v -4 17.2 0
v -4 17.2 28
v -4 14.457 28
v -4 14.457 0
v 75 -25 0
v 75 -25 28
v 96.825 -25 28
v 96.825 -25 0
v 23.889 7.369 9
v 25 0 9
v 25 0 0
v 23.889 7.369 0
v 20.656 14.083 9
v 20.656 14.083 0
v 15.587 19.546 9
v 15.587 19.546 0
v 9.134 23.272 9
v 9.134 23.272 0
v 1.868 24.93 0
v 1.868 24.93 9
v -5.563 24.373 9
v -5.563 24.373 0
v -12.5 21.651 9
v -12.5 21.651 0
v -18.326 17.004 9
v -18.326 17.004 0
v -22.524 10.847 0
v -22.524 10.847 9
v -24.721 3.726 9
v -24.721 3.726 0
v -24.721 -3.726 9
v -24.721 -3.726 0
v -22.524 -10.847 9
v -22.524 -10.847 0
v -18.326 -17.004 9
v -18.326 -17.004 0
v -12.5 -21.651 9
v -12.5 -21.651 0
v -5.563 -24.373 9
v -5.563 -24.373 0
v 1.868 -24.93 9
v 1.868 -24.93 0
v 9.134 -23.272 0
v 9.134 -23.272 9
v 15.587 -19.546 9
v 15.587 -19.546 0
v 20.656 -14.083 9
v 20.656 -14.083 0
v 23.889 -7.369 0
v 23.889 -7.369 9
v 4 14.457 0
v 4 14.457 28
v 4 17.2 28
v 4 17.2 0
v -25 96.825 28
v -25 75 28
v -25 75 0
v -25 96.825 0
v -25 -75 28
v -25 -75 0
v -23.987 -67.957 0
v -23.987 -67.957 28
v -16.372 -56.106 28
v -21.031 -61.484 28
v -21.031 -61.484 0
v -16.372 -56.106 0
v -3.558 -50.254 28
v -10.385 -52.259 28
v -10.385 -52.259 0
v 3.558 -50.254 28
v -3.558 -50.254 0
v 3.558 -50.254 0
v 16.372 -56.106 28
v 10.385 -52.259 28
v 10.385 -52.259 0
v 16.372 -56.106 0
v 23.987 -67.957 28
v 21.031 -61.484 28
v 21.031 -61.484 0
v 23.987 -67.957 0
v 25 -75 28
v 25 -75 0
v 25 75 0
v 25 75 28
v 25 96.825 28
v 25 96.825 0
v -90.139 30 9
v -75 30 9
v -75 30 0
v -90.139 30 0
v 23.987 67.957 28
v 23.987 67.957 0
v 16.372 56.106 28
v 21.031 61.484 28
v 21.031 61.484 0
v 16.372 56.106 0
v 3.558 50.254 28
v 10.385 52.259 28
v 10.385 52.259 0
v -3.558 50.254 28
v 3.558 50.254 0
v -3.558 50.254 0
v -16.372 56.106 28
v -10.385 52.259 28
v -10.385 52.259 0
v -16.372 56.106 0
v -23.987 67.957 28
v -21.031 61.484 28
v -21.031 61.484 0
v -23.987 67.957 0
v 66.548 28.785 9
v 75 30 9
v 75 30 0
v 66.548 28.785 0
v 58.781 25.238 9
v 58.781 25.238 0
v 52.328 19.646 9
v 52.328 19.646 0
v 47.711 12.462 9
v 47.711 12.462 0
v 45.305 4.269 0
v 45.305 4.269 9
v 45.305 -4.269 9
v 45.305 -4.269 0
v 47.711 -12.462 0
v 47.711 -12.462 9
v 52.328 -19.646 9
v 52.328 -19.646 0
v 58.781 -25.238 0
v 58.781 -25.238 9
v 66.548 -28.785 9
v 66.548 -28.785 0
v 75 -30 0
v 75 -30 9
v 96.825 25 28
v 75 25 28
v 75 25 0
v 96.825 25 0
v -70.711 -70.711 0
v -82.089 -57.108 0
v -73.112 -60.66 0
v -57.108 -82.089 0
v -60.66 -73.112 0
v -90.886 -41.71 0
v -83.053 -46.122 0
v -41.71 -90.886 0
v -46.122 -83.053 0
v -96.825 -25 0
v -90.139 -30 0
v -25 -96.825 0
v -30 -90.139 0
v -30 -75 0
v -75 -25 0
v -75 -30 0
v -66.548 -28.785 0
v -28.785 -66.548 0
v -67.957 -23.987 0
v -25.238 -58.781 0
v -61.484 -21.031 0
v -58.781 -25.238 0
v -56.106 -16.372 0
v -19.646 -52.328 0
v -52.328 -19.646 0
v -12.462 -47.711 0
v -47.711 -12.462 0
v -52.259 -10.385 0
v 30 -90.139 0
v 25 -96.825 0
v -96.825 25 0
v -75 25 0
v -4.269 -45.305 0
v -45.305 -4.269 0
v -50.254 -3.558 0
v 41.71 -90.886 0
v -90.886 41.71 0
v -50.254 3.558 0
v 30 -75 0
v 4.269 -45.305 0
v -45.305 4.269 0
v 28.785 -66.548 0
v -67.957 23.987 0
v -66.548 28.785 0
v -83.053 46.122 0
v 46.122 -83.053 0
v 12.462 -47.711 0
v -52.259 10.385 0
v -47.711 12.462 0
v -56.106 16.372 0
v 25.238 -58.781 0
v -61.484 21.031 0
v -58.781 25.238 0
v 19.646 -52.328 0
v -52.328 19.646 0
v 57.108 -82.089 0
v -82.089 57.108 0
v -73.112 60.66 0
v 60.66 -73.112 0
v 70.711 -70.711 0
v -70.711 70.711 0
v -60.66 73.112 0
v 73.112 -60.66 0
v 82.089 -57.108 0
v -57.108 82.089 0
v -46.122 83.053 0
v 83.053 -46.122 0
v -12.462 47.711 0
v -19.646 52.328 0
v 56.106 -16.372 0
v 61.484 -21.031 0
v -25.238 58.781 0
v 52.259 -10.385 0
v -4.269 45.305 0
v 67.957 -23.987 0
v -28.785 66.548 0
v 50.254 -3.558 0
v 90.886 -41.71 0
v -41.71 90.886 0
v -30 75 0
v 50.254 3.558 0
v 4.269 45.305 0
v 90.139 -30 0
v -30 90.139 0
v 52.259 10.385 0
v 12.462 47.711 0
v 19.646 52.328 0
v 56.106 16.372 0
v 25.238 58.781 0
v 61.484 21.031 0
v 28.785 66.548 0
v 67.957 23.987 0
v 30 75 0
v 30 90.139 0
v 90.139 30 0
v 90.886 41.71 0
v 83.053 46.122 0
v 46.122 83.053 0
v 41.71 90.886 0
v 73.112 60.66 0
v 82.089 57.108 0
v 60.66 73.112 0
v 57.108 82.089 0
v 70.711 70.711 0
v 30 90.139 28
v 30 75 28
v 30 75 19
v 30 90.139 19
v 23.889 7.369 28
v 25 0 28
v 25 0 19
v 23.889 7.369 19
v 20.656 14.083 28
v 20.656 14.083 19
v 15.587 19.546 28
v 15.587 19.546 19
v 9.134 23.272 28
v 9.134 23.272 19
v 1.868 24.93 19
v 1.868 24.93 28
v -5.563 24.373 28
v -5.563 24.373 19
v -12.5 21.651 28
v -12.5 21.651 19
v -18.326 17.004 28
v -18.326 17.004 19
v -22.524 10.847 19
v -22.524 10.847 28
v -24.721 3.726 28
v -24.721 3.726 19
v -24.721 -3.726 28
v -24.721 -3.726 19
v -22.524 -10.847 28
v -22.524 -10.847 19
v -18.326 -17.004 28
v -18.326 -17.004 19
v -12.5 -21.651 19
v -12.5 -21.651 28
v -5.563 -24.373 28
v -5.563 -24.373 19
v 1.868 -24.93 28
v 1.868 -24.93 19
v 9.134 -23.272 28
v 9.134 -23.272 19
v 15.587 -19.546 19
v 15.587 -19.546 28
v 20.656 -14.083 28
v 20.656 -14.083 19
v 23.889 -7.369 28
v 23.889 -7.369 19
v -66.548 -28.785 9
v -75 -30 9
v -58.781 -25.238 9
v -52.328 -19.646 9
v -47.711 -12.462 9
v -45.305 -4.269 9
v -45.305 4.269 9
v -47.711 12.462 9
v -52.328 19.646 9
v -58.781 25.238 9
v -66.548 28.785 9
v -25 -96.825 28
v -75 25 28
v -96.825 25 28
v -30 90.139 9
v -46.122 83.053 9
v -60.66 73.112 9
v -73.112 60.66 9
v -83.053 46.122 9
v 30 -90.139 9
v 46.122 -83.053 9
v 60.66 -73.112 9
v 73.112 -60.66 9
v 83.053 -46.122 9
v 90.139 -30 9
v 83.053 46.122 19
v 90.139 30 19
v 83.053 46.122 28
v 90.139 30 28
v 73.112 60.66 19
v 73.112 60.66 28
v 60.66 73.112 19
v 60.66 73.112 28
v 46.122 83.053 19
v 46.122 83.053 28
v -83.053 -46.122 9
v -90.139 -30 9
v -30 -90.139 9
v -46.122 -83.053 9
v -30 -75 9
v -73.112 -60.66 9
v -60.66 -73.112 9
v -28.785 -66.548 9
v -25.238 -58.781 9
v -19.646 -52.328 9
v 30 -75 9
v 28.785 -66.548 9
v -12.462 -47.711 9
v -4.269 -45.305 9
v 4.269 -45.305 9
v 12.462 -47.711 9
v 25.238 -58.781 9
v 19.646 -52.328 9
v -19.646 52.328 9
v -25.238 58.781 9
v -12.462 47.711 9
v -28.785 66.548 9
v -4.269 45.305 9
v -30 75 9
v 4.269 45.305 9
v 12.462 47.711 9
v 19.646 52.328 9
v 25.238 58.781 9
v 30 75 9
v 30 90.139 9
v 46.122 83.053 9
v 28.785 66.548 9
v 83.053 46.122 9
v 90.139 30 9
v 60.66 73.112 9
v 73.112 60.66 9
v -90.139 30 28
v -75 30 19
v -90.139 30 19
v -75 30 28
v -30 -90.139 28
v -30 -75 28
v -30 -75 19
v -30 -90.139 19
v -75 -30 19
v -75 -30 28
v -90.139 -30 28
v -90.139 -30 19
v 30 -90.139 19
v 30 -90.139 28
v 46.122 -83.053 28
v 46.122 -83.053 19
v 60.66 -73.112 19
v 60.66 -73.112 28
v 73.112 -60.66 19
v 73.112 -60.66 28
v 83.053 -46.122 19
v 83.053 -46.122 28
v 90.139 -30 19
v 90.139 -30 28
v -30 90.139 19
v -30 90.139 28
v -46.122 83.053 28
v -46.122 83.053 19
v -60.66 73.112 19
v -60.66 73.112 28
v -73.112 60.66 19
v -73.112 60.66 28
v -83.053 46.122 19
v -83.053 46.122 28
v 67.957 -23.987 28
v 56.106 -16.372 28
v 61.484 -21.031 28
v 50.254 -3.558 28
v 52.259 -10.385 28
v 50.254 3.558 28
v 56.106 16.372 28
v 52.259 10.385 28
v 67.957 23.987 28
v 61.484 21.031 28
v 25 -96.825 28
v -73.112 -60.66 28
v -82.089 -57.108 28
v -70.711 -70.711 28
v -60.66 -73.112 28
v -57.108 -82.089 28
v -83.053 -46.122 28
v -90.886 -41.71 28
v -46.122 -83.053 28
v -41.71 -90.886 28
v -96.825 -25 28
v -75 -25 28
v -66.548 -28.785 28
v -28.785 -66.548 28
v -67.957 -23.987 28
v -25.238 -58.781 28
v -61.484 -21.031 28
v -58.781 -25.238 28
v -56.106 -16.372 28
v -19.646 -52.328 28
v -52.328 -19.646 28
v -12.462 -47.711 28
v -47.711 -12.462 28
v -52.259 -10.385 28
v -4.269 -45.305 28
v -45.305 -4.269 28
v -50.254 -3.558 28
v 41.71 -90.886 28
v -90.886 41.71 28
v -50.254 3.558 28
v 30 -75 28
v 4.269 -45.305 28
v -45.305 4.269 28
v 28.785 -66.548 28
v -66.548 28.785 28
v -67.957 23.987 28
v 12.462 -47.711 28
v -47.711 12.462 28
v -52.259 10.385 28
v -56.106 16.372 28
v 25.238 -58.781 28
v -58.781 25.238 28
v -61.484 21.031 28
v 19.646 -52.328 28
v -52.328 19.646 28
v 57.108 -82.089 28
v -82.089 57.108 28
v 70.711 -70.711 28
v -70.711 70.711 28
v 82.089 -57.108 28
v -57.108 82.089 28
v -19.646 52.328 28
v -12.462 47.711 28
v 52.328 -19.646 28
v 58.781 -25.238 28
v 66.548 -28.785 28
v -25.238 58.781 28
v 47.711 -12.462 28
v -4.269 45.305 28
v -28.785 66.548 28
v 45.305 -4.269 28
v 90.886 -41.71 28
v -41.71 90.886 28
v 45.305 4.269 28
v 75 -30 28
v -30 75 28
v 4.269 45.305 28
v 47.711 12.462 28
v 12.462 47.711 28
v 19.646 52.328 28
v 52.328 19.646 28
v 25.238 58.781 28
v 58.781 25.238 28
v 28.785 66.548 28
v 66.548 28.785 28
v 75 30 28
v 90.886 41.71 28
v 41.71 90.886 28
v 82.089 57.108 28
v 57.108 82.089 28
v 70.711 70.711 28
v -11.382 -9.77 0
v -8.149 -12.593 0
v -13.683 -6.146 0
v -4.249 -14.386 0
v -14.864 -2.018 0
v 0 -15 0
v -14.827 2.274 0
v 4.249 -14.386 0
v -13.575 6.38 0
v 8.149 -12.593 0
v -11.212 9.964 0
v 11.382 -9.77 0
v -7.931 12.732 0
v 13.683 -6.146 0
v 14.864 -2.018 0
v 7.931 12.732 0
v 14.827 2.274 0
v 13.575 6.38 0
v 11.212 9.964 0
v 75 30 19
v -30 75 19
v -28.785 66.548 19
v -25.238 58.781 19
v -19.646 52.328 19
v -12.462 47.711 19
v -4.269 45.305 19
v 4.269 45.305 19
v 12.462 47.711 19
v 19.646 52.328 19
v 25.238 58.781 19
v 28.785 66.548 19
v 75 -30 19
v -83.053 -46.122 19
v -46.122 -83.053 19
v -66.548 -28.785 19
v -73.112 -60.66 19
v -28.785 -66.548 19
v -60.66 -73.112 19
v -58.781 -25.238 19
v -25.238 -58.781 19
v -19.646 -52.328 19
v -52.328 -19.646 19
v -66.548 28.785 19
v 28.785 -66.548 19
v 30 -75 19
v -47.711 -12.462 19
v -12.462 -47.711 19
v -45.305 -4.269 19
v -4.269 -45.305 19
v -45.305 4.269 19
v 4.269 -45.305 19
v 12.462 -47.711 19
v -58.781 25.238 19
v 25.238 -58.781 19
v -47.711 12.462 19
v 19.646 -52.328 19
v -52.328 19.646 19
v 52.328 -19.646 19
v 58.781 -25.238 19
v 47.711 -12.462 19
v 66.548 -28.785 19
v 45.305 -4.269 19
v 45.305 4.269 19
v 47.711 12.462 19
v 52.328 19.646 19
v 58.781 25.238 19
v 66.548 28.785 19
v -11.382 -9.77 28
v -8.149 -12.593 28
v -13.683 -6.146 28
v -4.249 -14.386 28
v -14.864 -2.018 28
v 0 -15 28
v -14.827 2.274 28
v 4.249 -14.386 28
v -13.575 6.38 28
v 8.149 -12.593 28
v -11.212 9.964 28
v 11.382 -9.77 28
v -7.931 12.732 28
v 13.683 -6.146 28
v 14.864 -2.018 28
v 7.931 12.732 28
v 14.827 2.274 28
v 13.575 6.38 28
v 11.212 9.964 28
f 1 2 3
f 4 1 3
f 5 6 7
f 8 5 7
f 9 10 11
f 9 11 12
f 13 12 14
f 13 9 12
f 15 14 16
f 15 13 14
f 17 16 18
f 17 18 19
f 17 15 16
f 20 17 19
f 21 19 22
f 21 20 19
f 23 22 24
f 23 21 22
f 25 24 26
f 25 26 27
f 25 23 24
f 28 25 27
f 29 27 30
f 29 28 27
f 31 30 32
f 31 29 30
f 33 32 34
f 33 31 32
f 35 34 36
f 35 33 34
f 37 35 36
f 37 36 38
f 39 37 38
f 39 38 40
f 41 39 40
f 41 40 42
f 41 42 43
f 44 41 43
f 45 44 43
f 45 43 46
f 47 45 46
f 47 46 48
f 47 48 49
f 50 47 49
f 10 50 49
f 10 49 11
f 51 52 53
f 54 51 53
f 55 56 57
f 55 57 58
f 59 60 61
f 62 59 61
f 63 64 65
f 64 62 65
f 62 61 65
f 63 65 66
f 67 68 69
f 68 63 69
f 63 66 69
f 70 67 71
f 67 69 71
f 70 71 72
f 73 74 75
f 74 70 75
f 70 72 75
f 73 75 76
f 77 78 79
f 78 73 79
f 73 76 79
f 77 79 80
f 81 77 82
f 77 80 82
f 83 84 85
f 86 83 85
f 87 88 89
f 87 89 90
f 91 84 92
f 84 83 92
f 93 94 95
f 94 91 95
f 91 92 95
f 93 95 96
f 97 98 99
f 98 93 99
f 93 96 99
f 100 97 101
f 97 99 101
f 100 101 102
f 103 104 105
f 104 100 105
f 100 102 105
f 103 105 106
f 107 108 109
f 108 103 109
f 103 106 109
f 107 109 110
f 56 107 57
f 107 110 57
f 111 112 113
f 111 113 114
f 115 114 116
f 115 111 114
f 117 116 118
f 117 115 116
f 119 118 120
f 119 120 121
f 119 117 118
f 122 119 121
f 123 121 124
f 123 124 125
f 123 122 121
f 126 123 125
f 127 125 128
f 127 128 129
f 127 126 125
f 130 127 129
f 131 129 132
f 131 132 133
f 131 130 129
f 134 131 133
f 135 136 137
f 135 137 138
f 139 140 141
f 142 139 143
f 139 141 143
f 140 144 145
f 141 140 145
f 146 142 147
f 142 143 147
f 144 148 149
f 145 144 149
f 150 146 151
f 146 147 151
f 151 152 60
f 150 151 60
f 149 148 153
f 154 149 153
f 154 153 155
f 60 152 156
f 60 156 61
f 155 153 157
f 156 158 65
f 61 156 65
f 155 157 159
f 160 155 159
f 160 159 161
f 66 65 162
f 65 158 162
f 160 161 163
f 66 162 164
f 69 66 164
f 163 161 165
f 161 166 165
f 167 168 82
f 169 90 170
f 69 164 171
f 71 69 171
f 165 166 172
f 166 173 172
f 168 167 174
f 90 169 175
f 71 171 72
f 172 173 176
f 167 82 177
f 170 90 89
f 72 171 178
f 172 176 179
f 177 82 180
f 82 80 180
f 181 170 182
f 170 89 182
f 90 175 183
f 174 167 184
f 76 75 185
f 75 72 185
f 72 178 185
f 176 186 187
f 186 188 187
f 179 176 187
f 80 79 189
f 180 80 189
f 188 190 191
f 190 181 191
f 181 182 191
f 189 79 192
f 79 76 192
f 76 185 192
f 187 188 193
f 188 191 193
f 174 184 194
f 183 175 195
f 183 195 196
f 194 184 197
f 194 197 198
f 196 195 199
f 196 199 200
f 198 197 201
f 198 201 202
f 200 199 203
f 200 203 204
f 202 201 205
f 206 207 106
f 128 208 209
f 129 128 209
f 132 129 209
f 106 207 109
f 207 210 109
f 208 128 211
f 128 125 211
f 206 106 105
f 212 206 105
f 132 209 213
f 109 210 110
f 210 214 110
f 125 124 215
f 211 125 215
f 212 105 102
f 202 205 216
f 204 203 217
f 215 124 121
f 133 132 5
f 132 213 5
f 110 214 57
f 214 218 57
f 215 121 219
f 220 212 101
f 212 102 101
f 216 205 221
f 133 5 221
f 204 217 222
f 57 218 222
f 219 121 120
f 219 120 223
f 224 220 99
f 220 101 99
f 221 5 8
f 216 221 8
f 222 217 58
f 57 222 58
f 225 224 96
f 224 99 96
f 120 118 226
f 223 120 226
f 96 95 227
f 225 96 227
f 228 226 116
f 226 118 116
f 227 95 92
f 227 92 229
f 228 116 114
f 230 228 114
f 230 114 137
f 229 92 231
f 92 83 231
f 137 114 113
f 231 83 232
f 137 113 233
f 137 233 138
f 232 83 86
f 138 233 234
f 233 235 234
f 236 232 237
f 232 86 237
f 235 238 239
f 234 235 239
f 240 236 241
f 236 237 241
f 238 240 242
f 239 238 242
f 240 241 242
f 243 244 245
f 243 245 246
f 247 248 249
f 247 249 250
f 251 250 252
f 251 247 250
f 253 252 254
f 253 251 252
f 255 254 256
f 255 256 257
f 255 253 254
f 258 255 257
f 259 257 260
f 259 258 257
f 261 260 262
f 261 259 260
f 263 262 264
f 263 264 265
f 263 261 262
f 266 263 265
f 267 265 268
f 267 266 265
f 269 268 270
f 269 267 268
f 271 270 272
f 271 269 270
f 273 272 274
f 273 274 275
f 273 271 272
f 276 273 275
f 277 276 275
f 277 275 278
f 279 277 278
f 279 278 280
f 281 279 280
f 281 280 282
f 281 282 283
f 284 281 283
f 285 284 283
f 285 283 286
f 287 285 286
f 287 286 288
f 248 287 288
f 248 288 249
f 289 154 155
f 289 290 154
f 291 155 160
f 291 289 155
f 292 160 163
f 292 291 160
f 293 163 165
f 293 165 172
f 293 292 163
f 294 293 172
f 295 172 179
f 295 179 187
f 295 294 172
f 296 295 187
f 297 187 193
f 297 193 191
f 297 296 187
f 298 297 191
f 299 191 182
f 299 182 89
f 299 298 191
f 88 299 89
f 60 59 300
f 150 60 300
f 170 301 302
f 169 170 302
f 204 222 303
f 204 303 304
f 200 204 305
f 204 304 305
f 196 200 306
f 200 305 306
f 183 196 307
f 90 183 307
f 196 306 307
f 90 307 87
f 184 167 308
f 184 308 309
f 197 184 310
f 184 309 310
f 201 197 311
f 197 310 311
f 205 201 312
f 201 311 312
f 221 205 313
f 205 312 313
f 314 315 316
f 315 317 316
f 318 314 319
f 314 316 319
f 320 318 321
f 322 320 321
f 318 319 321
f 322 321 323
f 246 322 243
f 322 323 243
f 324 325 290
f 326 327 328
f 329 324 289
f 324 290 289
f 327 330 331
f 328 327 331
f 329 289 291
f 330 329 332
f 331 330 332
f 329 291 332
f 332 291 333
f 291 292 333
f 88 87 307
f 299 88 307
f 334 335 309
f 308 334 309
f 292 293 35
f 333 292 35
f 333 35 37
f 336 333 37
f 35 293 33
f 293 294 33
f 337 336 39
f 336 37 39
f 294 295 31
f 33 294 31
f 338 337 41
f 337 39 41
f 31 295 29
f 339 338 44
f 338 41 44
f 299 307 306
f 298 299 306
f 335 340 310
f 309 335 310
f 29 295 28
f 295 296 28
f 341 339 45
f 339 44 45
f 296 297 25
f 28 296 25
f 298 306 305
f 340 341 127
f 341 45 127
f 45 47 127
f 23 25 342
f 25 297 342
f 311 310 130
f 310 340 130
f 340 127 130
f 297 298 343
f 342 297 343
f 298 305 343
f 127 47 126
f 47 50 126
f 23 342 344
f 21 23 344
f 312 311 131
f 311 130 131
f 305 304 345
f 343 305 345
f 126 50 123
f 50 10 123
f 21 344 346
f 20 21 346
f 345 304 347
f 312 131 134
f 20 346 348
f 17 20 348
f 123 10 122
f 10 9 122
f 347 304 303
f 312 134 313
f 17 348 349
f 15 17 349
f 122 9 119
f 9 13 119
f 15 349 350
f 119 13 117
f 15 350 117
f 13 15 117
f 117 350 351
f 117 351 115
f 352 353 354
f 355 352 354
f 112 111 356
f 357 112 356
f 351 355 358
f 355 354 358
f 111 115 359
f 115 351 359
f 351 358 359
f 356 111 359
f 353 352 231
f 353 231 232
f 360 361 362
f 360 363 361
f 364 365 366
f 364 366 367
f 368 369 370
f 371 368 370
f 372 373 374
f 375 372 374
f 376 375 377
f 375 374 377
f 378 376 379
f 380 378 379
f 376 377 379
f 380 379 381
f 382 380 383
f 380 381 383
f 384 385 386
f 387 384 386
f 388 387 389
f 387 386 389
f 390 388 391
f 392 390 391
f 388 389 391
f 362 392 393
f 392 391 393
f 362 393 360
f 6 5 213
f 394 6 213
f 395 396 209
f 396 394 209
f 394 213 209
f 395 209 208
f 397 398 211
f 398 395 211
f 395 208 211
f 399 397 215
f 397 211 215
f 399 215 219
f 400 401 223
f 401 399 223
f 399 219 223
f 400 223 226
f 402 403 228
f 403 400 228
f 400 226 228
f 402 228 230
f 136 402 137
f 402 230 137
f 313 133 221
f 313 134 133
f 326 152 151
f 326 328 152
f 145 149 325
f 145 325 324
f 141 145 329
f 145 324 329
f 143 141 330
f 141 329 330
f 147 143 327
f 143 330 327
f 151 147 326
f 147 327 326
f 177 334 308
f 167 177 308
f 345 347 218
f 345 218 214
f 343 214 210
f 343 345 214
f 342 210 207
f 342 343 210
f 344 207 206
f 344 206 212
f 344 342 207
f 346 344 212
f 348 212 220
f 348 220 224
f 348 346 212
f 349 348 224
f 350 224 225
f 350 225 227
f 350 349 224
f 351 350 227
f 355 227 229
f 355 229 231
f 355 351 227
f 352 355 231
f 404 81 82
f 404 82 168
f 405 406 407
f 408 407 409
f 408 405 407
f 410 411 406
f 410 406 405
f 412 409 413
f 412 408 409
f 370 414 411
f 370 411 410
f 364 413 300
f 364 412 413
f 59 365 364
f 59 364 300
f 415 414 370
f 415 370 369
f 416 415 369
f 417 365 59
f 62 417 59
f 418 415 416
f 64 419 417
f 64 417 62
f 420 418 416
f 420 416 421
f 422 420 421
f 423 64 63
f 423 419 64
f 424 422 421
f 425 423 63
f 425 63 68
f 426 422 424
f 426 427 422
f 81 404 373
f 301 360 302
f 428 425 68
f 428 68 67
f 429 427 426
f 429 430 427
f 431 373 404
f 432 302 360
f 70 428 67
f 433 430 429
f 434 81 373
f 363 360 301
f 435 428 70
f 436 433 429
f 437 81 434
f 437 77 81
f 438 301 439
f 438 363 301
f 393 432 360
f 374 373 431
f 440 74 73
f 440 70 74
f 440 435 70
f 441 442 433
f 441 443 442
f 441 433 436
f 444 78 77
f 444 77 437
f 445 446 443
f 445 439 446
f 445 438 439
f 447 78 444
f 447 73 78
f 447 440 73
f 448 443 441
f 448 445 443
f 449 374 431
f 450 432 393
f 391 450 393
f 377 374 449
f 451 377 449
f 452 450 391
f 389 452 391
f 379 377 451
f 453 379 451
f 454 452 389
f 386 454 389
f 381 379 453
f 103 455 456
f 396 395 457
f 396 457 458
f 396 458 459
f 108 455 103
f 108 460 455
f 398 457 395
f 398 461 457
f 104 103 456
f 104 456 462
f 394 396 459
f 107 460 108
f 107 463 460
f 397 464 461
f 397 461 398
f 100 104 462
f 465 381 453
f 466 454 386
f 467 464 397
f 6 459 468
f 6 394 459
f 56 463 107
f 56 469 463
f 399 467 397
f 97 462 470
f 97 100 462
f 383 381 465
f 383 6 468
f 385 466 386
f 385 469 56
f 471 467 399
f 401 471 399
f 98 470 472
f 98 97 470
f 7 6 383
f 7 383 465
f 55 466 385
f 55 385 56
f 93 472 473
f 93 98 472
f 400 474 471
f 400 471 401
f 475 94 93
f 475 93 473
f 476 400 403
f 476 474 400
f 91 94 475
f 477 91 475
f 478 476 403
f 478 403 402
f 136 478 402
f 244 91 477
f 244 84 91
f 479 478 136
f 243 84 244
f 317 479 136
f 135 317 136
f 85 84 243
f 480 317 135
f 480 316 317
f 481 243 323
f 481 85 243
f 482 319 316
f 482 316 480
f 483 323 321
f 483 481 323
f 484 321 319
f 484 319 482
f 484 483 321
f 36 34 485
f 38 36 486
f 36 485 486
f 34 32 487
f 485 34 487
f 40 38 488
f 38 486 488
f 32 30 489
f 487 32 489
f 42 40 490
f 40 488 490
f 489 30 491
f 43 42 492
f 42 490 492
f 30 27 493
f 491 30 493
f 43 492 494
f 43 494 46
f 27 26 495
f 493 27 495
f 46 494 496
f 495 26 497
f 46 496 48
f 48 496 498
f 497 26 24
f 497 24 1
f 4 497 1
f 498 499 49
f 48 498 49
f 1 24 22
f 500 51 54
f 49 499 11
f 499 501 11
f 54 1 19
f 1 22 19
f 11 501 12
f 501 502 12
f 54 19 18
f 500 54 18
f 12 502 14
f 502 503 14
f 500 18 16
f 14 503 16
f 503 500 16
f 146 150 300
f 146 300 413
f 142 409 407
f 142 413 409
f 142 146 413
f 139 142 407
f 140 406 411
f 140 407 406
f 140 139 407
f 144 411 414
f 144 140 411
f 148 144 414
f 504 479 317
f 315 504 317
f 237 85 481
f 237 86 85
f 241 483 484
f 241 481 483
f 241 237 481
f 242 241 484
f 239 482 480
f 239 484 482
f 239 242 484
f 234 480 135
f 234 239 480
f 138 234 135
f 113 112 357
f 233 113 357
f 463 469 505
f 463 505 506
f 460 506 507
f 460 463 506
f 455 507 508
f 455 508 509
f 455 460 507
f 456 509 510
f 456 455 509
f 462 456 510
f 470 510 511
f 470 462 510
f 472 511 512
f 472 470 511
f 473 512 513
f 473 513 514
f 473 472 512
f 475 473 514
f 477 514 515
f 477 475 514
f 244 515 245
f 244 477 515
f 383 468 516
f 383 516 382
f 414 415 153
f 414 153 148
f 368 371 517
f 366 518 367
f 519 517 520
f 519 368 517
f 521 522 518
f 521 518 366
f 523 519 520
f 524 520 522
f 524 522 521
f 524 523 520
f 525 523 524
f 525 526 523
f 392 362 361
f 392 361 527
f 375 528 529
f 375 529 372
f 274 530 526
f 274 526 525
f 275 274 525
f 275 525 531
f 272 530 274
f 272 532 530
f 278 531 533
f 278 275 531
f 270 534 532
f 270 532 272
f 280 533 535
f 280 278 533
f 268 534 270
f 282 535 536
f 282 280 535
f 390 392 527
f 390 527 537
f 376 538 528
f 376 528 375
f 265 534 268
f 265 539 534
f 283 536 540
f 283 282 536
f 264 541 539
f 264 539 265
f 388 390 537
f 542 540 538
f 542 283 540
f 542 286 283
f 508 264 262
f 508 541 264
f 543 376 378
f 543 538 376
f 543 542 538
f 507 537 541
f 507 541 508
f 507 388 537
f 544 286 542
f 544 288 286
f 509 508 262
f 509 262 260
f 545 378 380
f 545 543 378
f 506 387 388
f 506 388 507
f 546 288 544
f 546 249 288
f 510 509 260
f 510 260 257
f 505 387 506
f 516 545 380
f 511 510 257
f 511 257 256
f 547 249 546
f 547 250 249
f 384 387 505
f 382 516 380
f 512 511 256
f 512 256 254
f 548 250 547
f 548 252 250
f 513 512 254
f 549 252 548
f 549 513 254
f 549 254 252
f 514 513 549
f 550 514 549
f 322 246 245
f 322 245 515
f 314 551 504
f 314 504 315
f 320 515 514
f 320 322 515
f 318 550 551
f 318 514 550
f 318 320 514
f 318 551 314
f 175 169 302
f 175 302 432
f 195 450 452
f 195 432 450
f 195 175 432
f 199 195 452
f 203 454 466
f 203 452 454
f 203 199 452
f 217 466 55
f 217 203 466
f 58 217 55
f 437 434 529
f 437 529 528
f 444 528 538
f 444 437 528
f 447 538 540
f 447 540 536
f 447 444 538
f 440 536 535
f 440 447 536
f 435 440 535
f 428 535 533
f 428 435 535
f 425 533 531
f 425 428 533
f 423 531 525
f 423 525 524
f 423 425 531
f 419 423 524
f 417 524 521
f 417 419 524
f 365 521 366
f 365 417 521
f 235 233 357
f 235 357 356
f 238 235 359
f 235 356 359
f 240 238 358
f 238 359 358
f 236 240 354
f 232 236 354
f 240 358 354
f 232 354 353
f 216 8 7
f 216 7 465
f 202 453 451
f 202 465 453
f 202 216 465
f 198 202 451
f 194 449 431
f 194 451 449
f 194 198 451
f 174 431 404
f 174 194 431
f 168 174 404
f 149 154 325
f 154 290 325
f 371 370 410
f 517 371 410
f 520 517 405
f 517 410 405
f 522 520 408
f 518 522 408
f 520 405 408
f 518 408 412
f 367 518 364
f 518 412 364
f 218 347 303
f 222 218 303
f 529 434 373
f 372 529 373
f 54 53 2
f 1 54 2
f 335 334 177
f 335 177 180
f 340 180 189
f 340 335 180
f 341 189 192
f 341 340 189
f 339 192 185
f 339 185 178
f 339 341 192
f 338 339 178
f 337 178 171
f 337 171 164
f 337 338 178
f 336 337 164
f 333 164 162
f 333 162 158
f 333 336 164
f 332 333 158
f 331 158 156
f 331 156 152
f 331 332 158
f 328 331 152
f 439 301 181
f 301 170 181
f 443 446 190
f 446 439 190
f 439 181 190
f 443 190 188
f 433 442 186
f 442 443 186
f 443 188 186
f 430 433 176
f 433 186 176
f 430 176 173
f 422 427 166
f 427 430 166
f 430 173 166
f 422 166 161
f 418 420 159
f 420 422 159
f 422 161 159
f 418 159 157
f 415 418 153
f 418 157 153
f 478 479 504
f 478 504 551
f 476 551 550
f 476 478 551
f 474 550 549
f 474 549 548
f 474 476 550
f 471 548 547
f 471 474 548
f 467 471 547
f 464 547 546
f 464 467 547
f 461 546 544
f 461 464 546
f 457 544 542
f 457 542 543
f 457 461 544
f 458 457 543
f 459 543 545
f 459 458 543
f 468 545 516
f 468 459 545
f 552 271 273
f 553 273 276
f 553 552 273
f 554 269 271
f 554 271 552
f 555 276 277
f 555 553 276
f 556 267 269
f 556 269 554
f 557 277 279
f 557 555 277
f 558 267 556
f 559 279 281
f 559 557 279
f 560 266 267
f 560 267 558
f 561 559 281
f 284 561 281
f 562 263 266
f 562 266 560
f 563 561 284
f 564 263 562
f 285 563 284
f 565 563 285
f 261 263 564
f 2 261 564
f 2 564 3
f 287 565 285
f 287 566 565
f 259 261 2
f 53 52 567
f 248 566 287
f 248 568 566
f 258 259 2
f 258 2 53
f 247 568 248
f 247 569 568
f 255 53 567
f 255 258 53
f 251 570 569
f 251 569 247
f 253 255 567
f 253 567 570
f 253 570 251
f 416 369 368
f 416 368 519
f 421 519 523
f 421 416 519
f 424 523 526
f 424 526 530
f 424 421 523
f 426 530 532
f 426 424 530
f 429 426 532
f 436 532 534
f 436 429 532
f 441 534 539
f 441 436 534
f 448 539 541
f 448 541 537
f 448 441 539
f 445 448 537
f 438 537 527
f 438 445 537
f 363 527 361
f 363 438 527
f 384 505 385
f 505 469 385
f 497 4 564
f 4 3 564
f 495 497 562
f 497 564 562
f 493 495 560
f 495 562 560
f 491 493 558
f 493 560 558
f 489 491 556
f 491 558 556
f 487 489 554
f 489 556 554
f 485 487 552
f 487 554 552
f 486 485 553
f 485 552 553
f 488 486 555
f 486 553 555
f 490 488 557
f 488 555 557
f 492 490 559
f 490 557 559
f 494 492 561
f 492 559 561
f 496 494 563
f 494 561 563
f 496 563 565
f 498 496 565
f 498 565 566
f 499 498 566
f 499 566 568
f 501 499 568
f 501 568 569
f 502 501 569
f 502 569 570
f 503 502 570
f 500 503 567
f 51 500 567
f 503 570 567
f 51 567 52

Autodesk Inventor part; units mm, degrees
ref_plane "YZ Plane" through (0, 0, 0) normal (1, 0, 0) x (0, 1, 0)
ref_plane "XZ Plane" through (0, 0, 0) normal (0, 1, 0) x (-1, 0, 0)
ref_plane "XY Plane" through (0, 0, 0) normal (0, 0, 1) x (1, 0, 0)
sketch "草图1" plane through (0, 0, 0) normal (0, 0, 1) x (1, 0, 0)
  arc A0 (25, -75) -> (-25, -75) centre (0, -75) ccw
  line L0 (-25, -75) -> (-25, -96.8246)
  line L1 (25, -75) -> (25, -96.8246)
  line L2 (0, 0) -> (9.4022, 0)
  line L3 (0, 0) -> (0, -9.3611)
  arc A1 (75, 25) -> (75, -25) centre (75, 0) ccw
  line L4 (75, -25) -> (96.8246, -25)
  line L5 (75, 25) -> (96.8246, 25)
  arc A2 (-25, 75) -> (25, 75) centre (0, 75) ccw
  line L6 (25, 75) -> (25, 96.8246)
  line L7 (-25, 75) -> (-25, 96.8246)
  arc A3 (-75, -25) -> (-75, 25) centre (-75, 0) ccw
  line L8 (-75, 25) -> (-96.8246, 25)
  line L9 (-75, -25) -> (-96.8246, -25)
  arc A4 (-25, 96.8246) -> (-96.8246, 25) centre (0, 0) ccw
  arc A5 (96.8246, 25) -> (25, 96.8246) centre (0, 0) ccw
  arc A6 (-96.8246, -25) -> (-25, -96.8246) centre (0, 0) ccw
  arc A7 (25, -96.8246) -> (96.8246, -25) centre (0, 0) ccw
  dimension "d0" = 50
  dimension "d2" = 9.4022
  dimension "d3" = 9.3611
  dimension "d6" = 360
  dimension "d12" = 100
extrude "拉伸1" add sketch "草图1" along normal blind 28
sketch "草图2" plane through (0, 0, 28) normal (0, 0, 1) x (1, 0, 0)
  circle A0 centre (0, 0) radius 25
  arc A1 (30, -75) -> (-30, -75) centre (0, -75) ccw
  arc A2 (25, -75) -> (-25, -75) centre (0, -75) ccw projected
  line L0 (30, -75) -> (30, -90.1388)
  line L1 (-30, -75) -> (-30, -90.1388)
  arc A3 (75, 30) -> (75, -30) centre (75, 0) ccw
  line L2 (75, 30) -> (90.1388, 30)
  line L3 (75, -30) -> (90.1388, -30)
  arc A4 (-30, 75) -> (30, 75) centre (0, 75) ccw
  line L4 (-30, 75) -> (-30, 90.1388)
  line L5 (30, 75) -> (30, 90.1388)
  arc A5 (-75, -30) -> (-75, 30) centre (-75, 0) ccw
  line L6 (-75, -30) -> (-90.1388, -30)
  line L7 (-75, 30) -> (-90.1388, 30)
  arc A6 (-90.1388, -30) -> (-30, -90.1388) centre (0, 0) ccw
  arc A7 (-30, 90.1388) -> (-90.1388, 30) centre (0, 0) ccw
  arc A8 (30, -90.1388) -> (90.1388, -30) centre (0, 0) ccw
  arc A9 (90.1388, 30) -> (30, 90.1388) centre (0, 0) ccw
  dimension "d15" = 50
  dimension "d17" = 5
  dimension "d20" = 360
  dimension "d22" = 95
extrude "拉伸2" cut sketch "草图2" against normal blind 9
pattern_linear "矩形阵列1" count 2 spacing 19 along (0, 0, -1) of "拉伸2"
sketch "草图3" plane through (0, 0, 28) normal (0, 0, 1) x (1, 0, 0)
  circle A0 centre (0, 0) radius 15
  line L0 (-4, 14.4568) -> (4, 14.4568)
  line L1 (4, 14.4568) -> (4, 17.2)
  line L2 (4, 17.2) -> (-4, 17.2)
  line L3 (-4, 17.2) -> (-4, 14.4568)
  dimension "d28" = 30
  dimension "d29" = 17.2
  dimension "d30" = 8
extrude "拉伸3" cut sketch "草图3" against normal blind 28
properties part number "基准图-装填桶"
